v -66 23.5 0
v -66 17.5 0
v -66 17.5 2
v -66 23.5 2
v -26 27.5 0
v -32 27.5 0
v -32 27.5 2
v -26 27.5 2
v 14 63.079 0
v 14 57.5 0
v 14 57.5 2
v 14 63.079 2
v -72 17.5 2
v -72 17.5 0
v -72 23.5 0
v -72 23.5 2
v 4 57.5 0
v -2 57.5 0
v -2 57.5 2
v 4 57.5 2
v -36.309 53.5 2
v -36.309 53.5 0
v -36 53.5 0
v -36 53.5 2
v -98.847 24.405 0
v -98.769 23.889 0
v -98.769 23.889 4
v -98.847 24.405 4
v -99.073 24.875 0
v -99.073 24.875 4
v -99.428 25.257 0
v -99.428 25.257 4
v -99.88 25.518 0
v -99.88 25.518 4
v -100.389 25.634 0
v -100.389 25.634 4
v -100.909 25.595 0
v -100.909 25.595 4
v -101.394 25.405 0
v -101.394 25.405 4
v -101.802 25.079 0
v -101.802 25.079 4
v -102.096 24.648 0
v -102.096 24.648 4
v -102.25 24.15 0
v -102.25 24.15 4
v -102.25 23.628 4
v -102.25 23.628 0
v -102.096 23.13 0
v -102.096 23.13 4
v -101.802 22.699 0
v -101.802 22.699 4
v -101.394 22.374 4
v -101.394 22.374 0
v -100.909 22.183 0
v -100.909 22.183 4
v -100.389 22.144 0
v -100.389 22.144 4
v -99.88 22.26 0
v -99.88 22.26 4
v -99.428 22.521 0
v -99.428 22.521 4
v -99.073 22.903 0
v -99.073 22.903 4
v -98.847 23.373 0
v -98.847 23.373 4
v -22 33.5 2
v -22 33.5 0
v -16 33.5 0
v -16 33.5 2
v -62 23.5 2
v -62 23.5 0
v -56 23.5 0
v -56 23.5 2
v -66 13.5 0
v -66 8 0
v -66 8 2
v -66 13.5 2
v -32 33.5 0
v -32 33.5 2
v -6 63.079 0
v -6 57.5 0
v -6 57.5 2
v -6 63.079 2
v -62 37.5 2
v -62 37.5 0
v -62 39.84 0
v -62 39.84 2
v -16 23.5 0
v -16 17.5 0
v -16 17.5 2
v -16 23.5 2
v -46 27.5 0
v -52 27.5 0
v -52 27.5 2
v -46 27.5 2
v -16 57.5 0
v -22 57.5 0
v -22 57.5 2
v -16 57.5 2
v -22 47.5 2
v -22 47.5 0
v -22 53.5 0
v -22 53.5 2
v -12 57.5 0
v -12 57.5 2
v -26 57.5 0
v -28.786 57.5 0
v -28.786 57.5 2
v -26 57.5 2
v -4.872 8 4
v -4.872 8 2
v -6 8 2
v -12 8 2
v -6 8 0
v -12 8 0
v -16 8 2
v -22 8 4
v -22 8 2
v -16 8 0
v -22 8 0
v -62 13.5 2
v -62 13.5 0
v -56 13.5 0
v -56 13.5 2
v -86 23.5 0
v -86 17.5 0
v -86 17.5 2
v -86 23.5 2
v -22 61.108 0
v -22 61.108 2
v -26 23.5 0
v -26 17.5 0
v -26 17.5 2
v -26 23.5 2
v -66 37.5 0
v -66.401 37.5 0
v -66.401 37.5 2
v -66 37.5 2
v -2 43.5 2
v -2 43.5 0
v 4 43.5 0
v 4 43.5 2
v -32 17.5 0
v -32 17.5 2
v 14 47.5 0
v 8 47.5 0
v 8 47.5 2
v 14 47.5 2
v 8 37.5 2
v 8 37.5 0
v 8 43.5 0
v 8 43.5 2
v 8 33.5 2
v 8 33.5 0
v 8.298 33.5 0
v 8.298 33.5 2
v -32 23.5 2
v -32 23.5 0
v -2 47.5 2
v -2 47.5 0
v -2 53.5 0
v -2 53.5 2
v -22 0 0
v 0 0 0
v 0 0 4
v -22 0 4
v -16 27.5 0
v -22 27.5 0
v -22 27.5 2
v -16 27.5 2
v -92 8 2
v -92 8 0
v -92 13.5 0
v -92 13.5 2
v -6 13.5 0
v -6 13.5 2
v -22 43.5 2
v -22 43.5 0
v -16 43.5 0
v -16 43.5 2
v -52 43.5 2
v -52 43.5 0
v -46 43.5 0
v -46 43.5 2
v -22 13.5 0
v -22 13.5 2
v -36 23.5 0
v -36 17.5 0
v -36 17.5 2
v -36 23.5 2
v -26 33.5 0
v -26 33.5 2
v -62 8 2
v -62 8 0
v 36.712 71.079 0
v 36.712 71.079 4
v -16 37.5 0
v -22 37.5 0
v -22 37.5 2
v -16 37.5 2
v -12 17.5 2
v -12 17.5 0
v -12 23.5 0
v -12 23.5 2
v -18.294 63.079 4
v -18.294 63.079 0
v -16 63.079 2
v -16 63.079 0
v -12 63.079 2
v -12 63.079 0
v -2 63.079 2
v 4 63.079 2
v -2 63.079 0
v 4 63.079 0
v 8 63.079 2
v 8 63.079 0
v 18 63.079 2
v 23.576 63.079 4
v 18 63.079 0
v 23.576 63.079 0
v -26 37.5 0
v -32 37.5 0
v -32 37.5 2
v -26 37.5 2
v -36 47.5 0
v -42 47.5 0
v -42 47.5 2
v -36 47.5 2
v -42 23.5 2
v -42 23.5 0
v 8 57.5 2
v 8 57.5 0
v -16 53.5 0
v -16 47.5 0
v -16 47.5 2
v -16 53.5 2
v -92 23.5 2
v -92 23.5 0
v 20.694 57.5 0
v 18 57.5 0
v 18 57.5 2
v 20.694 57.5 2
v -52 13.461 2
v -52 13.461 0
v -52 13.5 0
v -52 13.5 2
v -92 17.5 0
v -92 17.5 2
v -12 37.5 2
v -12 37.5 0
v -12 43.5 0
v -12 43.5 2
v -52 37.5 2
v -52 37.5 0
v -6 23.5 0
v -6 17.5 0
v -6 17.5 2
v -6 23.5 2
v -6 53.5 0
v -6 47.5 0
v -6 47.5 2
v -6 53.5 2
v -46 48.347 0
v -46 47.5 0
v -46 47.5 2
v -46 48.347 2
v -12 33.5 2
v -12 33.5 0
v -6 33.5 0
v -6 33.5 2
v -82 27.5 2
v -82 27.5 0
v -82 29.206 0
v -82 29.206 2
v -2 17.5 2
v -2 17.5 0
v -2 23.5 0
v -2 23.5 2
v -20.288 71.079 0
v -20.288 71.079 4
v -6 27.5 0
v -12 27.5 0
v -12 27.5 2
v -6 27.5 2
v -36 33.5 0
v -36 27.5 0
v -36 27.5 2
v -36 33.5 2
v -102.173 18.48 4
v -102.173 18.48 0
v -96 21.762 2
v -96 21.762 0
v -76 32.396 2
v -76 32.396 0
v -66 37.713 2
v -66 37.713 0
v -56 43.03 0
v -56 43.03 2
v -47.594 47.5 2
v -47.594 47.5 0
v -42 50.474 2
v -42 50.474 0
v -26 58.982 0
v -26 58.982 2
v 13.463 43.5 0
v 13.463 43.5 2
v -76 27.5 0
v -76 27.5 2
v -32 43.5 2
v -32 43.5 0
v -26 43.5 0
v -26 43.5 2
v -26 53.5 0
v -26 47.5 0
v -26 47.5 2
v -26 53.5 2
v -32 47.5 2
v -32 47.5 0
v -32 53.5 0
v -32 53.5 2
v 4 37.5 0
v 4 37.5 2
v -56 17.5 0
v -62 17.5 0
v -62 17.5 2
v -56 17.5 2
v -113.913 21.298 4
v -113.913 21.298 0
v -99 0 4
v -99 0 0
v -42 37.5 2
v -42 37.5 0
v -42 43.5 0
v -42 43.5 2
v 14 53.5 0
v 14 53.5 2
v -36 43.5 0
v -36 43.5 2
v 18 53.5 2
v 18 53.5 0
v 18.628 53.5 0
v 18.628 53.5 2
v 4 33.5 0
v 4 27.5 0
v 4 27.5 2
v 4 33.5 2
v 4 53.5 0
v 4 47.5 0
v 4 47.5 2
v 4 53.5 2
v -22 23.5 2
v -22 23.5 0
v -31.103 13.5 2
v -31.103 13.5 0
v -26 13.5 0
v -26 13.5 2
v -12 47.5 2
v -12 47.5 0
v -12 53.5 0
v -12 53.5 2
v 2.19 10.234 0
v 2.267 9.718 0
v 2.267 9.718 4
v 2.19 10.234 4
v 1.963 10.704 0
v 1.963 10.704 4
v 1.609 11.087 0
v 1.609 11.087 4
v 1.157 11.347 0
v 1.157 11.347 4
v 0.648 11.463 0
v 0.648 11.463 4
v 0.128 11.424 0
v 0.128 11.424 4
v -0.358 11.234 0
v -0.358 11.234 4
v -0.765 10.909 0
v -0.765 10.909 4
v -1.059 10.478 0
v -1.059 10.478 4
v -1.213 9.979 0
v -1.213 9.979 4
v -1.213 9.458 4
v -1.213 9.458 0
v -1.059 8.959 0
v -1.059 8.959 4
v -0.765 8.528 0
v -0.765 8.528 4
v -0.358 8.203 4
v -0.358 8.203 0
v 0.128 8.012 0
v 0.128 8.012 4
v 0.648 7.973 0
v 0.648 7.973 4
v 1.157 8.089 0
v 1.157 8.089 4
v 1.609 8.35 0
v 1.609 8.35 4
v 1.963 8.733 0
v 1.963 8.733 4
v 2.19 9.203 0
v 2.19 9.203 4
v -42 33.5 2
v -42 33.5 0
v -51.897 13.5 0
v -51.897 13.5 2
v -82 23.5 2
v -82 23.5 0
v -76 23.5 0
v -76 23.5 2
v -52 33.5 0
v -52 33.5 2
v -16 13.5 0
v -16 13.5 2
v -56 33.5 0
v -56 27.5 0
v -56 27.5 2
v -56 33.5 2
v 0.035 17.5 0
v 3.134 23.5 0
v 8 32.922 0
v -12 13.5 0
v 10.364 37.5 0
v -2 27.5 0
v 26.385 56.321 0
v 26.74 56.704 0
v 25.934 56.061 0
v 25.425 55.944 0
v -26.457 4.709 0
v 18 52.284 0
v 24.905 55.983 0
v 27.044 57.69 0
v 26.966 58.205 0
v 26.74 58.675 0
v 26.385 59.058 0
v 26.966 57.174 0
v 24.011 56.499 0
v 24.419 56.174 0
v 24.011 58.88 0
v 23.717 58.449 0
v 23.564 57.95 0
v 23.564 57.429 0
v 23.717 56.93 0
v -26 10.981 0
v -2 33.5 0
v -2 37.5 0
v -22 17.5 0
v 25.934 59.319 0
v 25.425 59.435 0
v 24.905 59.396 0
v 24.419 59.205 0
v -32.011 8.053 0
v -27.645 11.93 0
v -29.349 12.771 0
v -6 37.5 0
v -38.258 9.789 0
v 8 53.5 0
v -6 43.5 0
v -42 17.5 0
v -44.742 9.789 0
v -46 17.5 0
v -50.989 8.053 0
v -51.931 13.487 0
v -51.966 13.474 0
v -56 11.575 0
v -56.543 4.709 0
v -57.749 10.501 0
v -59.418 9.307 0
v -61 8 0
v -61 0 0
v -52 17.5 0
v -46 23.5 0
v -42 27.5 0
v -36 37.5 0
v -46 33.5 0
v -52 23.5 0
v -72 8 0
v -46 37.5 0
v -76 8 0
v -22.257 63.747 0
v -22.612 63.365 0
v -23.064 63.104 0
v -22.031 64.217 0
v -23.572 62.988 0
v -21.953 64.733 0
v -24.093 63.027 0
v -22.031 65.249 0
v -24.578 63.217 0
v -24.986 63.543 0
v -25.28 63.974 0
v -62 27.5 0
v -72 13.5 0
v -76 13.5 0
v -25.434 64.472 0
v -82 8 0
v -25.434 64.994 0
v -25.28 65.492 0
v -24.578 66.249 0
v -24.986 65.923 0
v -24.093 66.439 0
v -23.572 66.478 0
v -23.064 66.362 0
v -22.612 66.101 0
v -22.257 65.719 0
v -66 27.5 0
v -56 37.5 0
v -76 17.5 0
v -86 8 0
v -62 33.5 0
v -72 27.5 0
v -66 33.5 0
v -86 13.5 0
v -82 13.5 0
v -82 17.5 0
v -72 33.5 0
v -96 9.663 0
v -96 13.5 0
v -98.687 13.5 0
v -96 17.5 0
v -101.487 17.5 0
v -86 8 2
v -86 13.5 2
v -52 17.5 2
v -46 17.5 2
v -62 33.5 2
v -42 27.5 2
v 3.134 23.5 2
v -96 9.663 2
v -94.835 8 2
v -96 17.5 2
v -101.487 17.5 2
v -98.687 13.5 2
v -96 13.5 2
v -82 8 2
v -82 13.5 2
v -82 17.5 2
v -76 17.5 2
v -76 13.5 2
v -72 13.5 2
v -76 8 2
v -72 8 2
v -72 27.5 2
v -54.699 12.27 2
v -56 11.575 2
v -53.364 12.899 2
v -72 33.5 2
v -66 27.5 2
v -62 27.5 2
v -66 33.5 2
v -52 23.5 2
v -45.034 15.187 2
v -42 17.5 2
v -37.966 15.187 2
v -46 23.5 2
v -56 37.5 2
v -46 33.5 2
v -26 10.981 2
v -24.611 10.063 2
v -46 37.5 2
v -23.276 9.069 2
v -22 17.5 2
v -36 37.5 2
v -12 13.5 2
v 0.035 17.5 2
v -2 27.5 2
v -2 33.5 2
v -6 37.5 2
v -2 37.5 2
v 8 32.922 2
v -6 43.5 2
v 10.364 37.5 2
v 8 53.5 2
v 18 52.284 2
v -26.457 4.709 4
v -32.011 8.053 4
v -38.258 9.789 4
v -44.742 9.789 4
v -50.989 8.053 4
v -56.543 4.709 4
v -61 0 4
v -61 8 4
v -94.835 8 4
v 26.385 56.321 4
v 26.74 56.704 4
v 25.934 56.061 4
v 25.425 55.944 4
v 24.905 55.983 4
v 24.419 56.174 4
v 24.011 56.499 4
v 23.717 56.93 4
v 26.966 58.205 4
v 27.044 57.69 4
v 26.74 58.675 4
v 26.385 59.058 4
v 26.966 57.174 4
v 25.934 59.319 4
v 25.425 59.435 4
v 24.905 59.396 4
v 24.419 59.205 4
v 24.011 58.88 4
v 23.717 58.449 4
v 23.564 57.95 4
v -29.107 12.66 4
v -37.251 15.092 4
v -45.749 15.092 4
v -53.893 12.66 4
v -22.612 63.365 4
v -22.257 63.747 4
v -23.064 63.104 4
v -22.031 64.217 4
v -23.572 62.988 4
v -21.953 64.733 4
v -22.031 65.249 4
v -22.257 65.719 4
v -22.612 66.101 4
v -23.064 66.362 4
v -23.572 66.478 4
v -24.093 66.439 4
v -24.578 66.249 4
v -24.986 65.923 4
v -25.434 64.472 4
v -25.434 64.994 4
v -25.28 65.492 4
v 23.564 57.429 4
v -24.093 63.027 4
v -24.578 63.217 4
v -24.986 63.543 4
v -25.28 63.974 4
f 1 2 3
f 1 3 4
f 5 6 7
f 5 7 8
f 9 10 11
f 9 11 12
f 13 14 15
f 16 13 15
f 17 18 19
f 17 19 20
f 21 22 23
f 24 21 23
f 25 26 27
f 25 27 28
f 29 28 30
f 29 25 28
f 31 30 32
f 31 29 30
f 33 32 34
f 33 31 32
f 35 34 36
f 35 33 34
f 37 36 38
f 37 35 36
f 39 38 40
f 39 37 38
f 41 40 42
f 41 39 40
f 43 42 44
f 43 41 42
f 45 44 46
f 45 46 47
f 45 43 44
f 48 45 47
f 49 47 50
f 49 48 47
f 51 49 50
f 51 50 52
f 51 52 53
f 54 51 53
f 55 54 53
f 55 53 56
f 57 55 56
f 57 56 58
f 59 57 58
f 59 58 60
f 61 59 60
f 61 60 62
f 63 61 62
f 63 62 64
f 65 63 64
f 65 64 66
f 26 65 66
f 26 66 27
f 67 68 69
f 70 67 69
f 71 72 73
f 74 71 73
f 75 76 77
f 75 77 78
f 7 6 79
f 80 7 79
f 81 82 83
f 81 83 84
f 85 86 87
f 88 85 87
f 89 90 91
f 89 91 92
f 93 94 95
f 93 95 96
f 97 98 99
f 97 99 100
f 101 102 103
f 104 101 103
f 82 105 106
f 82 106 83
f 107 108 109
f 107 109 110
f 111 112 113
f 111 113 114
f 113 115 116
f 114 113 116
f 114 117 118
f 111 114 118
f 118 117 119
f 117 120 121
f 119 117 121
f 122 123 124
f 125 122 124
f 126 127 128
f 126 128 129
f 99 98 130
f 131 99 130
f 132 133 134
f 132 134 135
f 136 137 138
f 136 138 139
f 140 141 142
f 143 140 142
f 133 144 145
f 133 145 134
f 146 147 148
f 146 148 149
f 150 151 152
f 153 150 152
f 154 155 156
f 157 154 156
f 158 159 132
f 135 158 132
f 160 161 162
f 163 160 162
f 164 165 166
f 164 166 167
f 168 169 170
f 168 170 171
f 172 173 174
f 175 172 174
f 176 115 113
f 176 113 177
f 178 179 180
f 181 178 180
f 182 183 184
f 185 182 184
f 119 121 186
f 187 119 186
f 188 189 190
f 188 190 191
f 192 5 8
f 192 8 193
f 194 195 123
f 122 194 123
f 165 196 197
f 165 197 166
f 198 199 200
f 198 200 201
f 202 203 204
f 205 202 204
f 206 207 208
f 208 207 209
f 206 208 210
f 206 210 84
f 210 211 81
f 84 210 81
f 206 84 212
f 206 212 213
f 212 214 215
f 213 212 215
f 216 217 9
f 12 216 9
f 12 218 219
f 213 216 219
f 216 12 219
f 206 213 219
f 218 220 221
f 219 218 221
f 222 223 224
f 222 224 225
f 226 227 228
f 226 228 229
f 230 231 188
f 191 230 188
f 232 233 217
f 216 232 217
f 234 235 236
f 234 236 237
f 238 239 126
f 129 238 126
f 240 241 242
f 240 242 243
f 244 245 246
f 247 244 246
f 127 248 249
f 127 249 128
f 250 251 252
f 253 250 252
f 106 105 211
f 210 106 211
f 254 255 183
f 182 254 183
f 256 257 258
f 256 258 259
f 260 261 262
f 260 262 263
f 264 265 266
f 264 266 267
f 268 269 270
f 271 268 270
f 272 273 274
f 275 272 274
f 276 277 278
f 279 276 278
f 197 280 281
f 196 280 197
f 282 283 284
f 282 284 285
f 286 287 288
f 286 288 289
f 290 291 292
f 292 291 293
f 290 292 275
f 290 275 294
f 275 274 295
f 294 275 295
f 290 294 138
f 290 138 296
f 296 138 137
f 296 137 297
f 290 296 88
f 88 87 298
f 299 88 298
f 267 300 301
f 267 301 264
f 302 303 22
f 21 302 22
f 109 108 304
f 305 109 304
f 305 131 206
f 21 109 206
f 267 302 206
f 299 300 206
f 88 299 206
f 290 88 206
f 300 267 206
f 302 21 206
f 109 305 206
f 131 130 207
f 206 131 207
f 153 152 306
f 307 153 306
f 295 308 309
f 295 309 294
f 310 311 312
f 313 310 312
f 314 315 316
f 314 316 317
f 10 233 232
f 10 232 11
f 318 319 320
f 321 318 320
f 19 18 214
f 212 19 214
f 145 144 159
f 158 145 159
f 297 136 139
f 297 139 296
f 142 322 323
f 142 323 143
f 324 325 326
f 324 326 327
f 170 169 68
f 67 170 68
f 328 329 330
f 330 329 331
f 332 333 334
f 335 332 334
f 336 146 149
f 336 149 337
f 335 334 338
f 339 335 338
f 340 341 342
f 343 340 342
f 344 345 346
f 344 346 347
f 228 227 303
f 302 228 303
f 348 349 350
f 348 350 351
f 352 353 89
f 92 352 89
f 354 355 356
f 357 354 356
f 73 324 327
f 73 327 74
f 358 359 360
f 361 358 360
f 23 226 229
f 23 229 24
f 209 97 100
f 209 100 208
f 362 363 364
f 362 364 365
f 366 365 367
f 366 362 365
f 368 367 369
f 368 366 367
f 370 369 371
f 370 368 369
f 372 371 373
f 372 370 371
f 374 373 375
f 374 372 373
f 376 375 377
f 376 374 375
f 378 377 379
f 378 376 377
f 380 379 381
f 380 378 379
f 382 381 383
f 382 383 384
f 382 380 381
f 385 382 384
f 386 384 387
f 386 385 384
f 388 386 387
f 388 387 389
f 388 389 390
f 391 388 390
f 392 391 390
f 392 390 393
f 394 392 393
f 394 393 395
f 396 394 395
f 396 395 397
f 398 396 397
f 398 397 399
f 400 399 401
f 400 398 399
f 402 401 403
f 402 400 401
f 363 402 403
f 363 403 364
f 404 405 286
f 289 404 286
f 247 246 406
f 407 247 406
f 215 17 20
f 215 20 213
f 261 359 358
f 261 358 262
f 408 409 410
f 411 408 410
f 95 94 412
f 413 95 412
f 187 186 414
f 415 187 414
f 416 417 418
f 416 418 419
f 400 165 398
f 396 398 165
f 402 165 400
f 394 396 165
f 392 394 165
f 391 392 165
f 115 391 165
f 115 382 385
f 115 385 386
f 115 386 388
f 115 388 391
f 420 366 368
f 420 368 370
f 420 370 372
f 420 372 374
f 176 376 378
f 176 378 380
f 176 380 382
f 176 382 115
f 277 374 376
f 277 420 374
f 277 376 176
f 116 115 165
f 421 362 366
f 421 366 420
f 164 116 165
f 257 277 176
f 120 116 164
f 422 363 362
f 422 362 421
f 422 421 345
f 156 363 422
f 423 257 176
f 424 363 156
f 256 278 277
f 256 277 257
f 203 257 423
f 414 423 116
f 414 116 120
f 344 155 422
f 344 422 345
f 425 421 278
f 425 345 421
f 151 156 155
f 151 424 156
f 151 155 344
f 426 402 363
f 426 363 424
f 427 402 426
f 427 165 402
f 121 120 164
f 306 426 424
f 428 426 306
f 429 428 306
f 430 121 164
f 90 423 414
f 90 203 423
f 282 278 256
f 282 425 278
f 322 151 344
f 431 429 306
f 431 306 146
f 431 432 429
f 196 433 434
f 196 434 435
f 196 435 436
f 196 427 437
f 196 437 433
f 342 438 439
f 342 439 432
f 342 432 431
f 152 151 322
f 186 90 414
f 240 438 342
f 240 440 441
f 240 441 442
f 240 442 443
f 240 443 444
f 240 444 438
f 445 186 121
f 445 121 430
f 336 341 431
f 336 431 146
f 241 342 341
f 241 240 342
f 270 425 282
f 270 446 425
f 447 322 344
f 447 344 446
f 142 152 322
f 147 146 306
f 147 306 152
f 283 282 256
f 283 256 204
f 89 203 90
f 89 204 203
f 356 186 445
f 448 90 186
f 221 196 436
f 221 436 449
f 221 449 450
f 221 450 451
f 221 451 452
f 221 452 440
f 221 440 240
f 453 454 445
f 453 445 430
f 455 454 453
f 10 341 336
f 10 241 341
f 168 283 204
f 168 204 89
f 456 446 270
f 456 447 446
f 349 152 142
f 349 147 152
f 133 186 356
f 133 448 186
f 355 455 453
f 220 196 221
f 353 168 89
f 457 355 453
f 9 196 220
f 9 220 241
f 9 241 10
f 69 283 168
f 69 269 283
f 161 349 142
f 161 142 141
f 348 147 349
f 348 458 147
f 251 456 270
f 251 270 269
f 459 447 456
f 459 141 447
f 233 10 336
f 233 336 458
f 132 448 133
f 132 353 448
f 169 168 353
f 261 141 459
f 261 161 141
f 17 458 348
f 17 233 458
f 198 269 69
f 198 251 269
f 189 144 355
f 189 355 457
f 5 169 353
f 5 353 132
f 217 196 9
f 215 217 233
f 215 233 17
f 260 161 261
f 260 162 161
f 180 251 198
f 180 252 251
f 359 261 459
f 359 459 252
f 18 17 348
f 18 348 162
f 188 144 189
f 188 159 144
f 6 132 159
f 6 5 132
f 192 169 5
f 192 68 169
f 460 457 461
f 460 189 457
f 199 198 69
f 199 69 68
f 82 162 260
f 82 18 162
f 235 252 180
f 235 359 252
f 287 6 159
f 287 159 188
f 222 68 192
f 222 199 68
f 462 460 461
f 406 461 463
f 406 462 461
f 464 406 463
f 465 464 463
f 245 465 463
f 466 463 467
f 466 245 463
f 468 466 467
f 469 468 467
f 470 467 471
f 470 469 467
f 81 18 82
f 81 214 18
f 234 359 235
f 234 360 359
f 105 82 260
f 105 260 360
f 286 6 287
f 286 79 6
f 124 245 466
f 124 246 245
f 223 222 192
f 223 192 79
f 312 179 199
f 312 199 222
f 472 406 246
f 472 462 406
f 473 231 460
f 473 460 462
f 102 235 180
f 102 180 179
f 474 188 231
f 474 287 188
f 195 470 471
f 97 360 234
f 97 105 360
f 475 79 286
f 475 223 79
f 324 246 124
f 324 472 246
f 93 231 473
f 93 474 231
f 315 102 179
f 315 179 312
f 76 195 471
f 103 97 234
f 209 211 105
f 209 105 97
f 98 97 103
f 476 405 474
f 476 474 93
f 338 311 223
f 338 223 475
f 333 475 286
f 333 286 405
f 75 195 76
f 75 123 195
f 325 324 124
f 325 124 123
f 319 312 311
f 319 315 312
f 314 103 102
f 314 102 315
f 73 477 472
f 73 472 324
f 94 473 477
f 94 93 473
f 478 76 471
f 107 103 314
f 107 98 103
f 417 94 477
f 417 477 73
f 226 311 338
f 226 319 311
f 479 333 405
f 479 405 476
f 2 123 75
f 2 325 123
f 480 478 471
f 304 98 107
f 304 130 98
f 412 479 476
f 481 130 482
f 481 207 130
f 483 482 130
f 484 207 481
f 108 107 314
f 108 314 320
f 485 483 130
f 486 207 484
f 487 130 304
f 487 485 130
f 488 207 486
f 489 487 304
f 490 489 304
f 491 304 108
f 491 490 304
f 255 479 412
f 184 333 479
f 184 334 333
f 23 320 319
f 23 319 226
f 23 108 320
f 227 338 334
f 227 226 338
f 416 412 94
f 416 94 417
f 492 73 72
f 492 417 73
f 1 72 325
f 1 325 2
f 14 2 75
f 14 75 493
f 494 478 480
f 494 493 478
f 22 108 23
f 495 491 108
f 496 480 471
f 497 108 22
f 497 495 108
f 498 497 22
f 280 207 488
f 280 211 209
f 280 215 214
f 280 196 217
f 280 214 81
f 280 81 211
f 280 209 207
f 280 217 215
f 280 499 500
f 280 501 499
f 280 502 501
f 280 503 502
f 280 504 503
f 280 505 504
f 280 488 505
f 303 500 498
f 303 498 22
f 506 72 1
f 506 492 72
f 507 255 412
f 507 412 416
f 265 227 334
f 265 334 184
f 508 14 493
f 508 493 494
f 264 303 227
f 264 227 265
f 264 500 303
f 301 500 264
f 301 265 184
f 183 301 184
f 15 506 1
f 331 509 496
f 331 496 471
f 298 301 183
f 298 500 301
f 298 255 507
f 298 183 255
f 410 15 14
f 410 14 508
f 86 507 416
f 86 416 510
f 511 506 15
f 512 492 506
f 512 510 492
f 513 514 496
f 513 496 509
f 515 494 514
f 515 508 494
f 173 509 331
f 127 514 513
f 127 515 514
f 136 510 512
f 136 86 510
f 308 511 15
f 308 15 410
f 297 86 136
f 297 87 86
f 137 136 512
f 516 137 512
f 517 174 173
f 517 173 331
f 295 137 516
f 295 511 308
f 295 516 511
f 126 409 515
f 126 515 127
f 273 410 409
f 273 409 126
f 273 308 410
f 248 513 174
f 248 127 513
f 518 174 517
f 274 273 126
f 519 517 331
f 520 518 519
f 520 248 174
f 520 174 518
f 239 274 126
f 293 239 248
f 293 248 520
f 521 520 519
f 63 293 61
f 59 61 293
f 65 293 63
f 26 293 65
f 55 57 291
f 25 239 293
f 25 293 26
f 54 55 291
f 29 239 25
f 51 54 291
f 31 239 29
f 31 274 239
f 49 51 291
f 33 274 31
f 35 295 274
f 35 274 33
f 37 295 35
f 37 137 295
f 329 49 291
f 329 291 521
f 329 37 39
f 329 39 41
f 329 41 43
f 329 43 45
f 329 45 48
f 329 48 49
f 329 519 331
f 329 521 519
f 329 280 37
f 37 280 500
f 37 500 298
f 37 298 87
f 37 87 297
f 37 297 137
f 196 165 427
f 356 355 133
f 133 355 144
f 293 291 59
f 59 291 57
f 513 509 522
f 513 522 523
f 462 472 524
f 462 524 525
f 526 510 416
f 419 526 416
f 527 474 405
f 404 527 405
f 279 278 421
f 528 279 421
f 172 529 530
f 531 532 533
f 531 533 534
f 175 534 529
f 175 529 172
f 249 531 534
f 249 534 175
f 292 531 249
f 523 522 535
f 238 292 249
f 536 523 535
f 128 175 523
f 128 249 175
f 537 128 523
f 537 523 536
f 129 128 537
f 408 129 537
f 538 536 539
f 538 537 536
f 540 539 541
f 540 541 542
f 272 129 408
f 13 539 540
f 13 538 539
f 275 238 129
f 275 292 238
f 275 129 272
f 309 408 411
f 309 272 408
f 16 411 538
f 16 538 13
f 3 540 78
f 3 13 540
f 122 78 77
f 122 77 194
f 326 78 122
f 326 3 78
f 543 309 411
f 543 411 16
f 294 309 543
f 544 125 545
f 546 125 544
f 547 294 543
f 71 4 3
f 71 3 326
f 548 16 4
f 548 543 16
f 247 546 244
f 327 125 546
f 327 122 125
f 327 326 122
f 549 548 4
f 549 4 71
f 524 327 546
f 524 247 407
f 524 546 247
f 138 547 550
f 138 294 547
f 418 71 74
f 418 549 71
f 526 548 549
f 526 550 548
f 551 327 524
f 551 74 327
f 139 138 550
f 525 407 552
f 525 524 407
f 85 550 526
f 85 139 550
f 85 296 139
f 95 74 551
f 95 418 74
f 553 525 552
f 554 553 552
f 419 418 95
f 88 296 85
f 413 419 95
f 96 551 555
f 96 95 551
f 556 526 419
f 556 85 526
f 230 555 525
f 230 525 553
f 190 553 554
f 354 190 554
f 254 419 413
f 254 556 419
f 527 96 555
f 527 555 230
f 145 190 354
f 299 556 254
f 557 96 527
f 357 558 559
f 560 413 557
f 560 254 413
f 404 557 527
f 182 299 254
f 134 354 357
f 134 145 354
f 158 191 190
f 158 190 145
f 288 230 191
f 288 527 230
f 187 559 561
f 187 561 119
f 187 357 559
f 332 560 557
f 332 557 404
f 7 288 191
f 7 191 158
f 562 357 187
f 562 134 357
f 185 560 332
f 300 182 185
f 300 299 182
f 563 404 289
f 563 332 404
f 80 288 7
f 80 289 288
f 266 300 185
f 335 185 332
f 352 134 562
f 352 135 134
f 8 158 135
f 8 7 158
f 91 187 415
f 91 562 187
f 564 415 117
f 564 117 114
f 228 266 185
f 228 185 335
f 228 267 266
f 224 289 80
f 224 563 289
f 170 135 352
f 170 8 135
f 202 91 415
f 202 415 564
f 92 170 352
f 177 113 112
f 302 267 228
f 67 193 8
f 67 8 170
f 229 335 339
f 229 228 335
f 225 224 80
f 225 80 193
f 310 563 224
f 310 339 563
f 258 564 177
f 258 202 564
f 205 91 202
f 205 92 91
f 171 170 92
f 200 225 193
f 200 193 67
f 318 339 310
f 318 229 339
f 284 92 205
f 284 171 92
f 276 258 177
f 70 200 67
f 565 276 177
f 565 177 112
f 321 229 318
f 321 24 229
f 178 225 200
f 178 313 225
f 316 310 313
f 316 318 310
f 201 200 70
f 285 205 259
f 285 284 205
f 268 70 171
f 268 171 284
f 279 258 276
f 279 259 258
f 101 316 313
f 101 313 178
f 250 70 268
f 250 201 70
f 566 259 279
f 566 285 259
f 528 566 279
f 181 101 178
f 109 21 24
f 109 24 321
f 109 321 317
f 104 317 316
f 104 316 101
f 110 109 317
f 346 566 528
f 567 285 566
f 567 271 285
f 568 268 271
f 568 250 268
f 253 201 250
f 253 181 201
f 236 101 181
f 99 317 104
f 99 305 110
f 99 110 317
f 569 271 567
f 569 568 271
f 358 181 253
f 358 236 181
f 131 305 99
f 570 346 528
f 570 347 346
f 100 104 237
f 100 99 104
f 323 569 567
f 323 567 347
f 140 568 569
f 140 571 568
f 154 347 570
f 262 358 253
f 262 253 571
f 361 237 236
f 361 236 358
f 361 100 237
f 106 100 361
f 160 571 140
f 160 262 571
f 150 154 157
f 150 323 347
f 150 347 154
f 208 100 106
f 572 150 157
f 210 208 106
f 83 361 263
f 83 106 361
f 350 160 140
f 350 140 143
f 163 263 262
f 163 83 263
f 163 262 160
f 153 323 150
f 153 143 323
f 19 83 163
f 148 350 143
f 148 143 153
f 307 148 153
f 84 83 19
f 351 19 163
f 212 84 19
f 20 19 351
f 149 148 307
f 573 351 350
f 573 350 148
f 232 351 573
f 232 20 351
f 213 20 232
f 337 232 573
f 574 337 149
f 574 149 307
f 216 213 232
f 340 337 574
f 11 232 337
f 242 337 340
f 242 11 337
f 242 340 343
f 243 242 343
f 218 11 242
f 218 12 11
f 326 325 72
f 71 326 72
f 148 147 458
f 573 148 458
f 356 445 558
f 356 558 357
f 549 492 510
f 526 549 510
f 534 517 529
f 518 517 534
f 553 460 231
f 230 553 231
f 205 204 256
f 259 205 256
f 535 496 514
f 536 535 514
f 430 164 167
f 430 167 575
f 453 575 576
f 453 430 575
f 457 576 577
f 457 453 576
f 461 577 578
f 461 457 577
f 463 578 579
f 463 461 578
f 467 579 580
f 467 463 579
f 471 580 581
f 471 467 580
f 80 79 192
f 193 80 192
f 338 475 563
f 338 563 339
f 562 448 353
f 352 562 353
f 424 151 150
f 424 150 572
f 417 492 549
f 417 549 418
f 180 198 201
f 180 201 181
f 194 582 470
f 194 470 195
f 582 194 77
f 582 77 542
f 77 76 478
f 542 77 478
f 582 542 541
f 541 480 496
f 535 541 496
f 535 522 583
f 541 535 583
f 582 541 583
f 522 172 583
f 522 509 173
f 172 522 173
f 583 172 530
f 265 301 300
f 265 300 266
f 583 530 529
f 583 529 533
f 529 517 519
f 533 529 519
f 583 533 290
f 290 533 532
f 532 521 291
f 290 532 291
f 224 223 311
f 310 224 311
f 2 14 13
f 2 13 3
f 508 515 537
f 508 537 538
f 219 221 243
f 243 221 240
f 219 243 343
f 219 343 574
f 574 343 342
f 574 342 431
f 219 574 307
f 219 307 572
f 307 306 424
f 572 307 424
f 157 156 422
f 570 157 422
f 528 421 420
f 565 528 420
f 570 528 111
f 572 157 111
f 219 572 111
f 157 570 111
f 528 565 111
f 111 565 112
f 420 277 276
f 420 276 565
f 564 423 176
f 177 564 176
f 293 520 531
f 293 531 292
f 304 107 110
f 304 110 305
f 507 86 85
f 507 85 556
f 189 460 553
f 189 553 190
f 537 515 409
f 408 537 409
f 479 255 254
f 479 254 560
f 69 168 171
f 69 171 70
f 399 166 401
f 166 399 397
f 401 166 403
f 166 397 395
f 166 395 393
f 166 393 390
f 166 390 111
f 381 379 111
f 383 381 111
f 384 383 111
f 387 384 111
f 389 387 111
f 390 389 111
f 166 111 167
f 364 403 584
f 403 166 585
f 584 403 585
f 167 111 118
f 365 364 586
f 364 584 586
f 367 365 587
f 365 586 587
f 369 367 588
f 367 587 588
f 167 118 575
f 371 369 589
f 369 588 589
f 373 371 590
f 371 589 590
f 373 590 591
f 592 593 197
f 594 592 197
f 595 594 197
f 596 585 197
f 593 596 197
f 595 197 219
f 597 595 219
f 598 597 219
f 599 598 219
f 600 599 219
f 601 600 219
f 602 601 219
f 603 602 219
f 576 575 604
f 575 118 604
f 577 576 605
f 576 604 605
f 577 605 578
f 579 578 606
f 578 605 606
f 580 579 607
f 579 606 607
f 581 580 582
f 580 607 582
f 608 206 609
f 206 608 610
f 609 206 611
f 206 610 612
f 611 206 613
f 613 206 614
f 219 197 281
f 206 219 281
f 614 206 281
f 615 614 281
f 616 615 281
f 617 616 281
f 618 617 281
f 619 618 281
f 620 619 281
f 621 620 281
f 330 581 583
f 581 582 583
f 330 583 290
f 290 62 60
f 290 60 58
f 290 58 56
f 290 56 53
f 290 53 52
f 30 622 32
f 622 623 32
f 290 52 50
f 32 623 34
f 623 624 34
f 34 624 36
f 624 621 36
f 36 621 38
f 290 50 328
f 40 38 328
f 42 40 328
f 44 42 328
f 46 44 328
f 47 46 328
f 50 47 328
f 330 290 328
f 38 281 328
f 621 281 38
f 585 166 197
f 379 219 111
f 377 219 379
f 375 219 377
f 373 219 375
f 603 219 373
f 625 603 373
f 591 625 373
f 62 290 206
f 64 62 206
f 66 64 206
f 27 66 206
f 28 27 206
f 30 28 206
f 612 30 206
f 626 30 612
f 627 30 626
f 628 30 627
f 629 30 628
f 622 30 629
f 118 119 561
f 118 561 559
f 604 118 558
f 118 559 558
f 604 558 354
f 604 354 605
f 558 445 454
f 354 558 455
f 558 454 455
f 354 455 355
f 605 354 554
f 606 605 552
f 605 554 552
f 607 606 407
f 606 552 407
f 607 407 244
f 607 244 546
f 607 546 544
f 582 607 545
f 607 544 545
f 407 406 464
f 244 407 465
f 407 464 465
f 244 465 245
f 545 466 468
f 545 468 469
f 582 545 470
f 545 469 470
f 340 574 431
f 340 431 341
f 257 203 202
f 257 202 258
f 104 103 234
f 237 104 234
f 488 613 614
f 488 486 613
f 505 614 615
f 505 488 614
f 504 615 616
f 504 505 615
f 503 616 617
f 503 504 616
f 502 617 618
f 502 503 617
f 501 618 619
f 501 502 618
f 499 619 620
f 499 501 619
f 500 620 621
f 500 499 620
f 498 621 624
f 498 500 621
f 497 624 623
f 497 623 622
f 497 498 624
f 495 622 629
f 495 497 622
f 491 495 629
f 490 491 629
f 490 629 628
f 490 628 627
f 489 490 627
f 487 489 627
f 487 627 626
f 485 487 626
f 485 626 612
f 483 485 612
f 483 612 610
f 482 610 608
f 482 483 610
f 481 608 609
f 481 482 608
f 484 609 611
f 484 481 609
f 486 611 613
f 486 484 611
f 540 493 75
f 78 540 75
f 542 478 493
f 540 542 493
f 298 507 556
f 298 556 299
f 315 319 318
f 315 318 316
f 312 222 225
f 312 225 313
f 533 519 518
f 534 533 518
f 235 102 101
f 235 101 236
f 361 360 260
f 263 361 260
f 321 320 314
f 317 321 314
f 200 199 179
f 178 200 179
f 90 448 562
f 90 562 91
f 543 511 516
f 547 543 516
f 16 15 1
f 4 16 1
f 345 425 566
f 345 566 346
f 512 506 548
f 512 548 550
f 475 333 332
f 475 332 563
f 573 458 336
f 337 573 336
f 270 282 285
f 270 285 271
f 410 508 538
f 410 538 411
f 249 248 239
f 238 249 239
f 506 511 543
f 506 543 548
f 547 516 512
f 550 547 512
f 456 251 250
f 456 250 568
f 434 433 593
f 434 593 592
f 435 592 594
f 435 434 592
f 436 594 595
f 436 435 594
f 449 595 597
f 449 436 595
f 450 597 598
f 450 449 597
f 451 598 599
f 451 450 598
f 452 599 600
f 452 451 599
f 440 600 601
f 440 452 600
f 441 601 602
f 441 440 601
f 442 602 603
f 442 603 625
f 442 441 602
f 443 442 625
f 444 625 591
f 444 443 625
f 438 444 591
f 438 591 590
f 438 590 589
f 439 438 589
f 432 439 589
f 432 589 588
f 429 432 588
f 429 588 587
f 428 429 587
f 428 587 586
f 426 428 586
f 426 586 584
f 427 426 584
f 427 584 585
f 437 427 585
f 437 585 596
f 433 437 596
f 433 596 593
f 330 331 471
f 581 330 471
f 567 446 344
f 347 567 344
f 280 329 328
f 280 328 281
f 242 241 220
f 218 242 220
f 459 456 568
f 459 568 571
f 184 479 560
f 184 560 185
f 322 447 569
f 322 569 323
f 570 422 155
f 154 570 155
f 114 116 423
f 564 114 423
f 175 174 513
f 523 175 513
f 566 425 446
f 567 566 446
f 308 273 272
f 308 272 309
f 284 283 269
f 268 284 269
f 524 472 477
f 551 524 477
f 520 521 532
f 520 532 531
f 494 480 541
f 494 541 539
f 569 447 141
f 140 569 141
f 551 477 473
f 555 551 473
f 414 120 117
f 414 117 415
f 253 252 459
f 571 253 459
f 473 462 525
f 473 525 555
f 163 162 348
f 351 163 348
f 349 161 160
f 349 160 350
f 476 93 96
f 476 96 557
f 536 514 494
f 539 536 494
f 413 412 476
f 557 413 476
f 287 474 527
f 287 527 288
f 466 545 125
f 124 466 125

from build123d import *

# Parameters (mm, degrees)
SKETCH002_R      = 1.75
PAD002_DEPTH     = 25
SKETCH_R         = 1.75
PAD_DEPTH        = 4
BOX001_W         = 157
BOX001_H         = 4
BOX001_DEPTH     = 2
ARRAY001_Y_COUNT = 7
ARRAY001_Y_PITCH = 10
BOX_W            = 4
BOX_H            = 71
BOX_DEPTH        = 2
ARRAY_X_COUNT    = 14
ARRAY_X_PITCH    = 10
PAD001_DEPTH     = 10


with BuildPart() as pad002:
    # Sketch002 → Pad002 (new body)
    with BuildSketch(Plane.XY.offset(-5)):
        with Locations((-100.519385, 23.889178)):
            Circle(SKETCH002_R)
        with Locations((-23.703251, 64.733041)):
            Circle(SKETCH002_R)
        with Locations((25.294184, 57.68959)):
            Circle(SKETCH002_R)
        with Locations((0.517434, 9.718367)):
            Circle(SKETCH002_R)
    extrude(amount=PAD002_DEPTH)


with BuildPart() as pad:
    # Sketch → Pad (new body)
    with BuildSketch(Plane.XY):
        with BuildLine():
            Line((-113.912987, 21.297953), (-20.288199, 71.079136))
            Line((-20.288199, 71.079136), (36.711801, 71.079136))
            Line((36.711801, 71.079136), (0, 0))
            Line((0, 0), (-22, 0))
            ThreePointArc((-22, 0), (-41.5, 10.008931), (-61, 0))
            Line((-99, 0), (-61, 0))
            Line((-113.912987, 21.297953), (-99, 0))
        make_face()
        with Locations((-100.519385, 23.889178)):
            Circle(SKETCH_R, mode=Mode.SUBTRACT)
        with Locations((-23.703251, 64.733041)):
            Circle(SKETCH_R, mode=Mode.SUBTRACT)
        with Locations((25.294184, 57.68959)):
            Circle(SKETCH_R, mode=Mode.SUBTRACT)
        with Locations((0.517434, 9.718367)):
            Circle(SKETCH_R, mode=Mode.SUBTRACT)
        with BuildLine():
            Line((-61, 8), (-94.835464, 8))
            Line((-94.835464, 8), (-102.173289, 18.479501))
            Line((-102.173289, 18.479501), (-18.293574, 63.079136))
            Line((-18.293574, 63.079136), (23.575817, 63.079136))
            Line((23.575817, 63.079136), (-4.872113, 8))
            Line((-4.872113, 8), (-22, 8))
            ThreePointArc((-22, 8), (-41.5, 15.400377), (-61, 8))
        make_face(mode=Mode.SUBTRACT)
    extrude(amount=PAD_DEPTH)


with BuildPart() as array001:
    # Box001 → Box001 (new body)
    with BuildSketch(Plane(origin=(-115, 0, 0), x_dir=(1, 0, 0), z_dir=(0, 0, 1))):
        with Locations((78.5, 2)):
            Rectangle(BOX001_W, BOX001_H)
    extrude(amount=BOX001_DEPTH)

    # Array001 Y: Array001 ×7


with BuildPart() as array001_1:
    add(array001.part)
    with Locations(*[(0, i * ARRAY001_Y_PITCH, 0) for i in range(1, ARRAY001_Y_COUNT)]):
        add(array001.part)


with BuildPart() as array001_2:
    # Array001 placement: moved
    add(array001_1.part.moved(Location((0, 3.5, 0))))


with BuildPart() as fusion:
    # Box → Box (new body)
    with BuildSketch(Plane.XY):
        with Locations((2, 35.5)):
            Rectangle(BOX_W, BOX_H)
    extrude(amount=BOX_DEPTH)

    # Array X: Fusion ×14


with BuildPart() as fusion_1:
    add(fusion.part)
    with Locations(*[(i * ARRAY_X_PITCH, 0, 0) for i in range(1, ARRAY_X_COUNT)]):
        add(fusion.part)


with BuildPart() as fusion_2:
    # Array placement: moved
    add(fusion_1.part.moved(Location((-96, 0, 0))))

    # Fusion: union Array001
    add(array001_2.part)


with BuildPart() as cut:
    # Sketch001 → Pad001 (new body)
    with BuildSketch(Plane.XY.offset(-1)):
        with BuildLine():
            Line((-113.912987, 21.297953), (-20.288199, 71.079136))
            Line((-20.288199, 71.079136), (36.711801, 71.079136))
            Line((36.711801, 71.079136), (0, 0))
            Line((0, 0), (-22, 0))
            ThreePointArc((-22, 0), (-41.5, 10.008931), (-61, 0))
            Line((-99, 0), (-61, 0))
            Line((-113.912987, 21.297953), (-99, 0))
        make_face()
    extrude(amount=PAD001_DEPTH)

    # Common: intersect Fusion
    add(fusion_2.part, mode=Mode.INTERSECT)

    # Fusion001: union Pad
    add(pad.part)

    # Cut: cut Pad002
    add(pad002.part, mode=Mode.SUBTRACT)


solid = cut.part
